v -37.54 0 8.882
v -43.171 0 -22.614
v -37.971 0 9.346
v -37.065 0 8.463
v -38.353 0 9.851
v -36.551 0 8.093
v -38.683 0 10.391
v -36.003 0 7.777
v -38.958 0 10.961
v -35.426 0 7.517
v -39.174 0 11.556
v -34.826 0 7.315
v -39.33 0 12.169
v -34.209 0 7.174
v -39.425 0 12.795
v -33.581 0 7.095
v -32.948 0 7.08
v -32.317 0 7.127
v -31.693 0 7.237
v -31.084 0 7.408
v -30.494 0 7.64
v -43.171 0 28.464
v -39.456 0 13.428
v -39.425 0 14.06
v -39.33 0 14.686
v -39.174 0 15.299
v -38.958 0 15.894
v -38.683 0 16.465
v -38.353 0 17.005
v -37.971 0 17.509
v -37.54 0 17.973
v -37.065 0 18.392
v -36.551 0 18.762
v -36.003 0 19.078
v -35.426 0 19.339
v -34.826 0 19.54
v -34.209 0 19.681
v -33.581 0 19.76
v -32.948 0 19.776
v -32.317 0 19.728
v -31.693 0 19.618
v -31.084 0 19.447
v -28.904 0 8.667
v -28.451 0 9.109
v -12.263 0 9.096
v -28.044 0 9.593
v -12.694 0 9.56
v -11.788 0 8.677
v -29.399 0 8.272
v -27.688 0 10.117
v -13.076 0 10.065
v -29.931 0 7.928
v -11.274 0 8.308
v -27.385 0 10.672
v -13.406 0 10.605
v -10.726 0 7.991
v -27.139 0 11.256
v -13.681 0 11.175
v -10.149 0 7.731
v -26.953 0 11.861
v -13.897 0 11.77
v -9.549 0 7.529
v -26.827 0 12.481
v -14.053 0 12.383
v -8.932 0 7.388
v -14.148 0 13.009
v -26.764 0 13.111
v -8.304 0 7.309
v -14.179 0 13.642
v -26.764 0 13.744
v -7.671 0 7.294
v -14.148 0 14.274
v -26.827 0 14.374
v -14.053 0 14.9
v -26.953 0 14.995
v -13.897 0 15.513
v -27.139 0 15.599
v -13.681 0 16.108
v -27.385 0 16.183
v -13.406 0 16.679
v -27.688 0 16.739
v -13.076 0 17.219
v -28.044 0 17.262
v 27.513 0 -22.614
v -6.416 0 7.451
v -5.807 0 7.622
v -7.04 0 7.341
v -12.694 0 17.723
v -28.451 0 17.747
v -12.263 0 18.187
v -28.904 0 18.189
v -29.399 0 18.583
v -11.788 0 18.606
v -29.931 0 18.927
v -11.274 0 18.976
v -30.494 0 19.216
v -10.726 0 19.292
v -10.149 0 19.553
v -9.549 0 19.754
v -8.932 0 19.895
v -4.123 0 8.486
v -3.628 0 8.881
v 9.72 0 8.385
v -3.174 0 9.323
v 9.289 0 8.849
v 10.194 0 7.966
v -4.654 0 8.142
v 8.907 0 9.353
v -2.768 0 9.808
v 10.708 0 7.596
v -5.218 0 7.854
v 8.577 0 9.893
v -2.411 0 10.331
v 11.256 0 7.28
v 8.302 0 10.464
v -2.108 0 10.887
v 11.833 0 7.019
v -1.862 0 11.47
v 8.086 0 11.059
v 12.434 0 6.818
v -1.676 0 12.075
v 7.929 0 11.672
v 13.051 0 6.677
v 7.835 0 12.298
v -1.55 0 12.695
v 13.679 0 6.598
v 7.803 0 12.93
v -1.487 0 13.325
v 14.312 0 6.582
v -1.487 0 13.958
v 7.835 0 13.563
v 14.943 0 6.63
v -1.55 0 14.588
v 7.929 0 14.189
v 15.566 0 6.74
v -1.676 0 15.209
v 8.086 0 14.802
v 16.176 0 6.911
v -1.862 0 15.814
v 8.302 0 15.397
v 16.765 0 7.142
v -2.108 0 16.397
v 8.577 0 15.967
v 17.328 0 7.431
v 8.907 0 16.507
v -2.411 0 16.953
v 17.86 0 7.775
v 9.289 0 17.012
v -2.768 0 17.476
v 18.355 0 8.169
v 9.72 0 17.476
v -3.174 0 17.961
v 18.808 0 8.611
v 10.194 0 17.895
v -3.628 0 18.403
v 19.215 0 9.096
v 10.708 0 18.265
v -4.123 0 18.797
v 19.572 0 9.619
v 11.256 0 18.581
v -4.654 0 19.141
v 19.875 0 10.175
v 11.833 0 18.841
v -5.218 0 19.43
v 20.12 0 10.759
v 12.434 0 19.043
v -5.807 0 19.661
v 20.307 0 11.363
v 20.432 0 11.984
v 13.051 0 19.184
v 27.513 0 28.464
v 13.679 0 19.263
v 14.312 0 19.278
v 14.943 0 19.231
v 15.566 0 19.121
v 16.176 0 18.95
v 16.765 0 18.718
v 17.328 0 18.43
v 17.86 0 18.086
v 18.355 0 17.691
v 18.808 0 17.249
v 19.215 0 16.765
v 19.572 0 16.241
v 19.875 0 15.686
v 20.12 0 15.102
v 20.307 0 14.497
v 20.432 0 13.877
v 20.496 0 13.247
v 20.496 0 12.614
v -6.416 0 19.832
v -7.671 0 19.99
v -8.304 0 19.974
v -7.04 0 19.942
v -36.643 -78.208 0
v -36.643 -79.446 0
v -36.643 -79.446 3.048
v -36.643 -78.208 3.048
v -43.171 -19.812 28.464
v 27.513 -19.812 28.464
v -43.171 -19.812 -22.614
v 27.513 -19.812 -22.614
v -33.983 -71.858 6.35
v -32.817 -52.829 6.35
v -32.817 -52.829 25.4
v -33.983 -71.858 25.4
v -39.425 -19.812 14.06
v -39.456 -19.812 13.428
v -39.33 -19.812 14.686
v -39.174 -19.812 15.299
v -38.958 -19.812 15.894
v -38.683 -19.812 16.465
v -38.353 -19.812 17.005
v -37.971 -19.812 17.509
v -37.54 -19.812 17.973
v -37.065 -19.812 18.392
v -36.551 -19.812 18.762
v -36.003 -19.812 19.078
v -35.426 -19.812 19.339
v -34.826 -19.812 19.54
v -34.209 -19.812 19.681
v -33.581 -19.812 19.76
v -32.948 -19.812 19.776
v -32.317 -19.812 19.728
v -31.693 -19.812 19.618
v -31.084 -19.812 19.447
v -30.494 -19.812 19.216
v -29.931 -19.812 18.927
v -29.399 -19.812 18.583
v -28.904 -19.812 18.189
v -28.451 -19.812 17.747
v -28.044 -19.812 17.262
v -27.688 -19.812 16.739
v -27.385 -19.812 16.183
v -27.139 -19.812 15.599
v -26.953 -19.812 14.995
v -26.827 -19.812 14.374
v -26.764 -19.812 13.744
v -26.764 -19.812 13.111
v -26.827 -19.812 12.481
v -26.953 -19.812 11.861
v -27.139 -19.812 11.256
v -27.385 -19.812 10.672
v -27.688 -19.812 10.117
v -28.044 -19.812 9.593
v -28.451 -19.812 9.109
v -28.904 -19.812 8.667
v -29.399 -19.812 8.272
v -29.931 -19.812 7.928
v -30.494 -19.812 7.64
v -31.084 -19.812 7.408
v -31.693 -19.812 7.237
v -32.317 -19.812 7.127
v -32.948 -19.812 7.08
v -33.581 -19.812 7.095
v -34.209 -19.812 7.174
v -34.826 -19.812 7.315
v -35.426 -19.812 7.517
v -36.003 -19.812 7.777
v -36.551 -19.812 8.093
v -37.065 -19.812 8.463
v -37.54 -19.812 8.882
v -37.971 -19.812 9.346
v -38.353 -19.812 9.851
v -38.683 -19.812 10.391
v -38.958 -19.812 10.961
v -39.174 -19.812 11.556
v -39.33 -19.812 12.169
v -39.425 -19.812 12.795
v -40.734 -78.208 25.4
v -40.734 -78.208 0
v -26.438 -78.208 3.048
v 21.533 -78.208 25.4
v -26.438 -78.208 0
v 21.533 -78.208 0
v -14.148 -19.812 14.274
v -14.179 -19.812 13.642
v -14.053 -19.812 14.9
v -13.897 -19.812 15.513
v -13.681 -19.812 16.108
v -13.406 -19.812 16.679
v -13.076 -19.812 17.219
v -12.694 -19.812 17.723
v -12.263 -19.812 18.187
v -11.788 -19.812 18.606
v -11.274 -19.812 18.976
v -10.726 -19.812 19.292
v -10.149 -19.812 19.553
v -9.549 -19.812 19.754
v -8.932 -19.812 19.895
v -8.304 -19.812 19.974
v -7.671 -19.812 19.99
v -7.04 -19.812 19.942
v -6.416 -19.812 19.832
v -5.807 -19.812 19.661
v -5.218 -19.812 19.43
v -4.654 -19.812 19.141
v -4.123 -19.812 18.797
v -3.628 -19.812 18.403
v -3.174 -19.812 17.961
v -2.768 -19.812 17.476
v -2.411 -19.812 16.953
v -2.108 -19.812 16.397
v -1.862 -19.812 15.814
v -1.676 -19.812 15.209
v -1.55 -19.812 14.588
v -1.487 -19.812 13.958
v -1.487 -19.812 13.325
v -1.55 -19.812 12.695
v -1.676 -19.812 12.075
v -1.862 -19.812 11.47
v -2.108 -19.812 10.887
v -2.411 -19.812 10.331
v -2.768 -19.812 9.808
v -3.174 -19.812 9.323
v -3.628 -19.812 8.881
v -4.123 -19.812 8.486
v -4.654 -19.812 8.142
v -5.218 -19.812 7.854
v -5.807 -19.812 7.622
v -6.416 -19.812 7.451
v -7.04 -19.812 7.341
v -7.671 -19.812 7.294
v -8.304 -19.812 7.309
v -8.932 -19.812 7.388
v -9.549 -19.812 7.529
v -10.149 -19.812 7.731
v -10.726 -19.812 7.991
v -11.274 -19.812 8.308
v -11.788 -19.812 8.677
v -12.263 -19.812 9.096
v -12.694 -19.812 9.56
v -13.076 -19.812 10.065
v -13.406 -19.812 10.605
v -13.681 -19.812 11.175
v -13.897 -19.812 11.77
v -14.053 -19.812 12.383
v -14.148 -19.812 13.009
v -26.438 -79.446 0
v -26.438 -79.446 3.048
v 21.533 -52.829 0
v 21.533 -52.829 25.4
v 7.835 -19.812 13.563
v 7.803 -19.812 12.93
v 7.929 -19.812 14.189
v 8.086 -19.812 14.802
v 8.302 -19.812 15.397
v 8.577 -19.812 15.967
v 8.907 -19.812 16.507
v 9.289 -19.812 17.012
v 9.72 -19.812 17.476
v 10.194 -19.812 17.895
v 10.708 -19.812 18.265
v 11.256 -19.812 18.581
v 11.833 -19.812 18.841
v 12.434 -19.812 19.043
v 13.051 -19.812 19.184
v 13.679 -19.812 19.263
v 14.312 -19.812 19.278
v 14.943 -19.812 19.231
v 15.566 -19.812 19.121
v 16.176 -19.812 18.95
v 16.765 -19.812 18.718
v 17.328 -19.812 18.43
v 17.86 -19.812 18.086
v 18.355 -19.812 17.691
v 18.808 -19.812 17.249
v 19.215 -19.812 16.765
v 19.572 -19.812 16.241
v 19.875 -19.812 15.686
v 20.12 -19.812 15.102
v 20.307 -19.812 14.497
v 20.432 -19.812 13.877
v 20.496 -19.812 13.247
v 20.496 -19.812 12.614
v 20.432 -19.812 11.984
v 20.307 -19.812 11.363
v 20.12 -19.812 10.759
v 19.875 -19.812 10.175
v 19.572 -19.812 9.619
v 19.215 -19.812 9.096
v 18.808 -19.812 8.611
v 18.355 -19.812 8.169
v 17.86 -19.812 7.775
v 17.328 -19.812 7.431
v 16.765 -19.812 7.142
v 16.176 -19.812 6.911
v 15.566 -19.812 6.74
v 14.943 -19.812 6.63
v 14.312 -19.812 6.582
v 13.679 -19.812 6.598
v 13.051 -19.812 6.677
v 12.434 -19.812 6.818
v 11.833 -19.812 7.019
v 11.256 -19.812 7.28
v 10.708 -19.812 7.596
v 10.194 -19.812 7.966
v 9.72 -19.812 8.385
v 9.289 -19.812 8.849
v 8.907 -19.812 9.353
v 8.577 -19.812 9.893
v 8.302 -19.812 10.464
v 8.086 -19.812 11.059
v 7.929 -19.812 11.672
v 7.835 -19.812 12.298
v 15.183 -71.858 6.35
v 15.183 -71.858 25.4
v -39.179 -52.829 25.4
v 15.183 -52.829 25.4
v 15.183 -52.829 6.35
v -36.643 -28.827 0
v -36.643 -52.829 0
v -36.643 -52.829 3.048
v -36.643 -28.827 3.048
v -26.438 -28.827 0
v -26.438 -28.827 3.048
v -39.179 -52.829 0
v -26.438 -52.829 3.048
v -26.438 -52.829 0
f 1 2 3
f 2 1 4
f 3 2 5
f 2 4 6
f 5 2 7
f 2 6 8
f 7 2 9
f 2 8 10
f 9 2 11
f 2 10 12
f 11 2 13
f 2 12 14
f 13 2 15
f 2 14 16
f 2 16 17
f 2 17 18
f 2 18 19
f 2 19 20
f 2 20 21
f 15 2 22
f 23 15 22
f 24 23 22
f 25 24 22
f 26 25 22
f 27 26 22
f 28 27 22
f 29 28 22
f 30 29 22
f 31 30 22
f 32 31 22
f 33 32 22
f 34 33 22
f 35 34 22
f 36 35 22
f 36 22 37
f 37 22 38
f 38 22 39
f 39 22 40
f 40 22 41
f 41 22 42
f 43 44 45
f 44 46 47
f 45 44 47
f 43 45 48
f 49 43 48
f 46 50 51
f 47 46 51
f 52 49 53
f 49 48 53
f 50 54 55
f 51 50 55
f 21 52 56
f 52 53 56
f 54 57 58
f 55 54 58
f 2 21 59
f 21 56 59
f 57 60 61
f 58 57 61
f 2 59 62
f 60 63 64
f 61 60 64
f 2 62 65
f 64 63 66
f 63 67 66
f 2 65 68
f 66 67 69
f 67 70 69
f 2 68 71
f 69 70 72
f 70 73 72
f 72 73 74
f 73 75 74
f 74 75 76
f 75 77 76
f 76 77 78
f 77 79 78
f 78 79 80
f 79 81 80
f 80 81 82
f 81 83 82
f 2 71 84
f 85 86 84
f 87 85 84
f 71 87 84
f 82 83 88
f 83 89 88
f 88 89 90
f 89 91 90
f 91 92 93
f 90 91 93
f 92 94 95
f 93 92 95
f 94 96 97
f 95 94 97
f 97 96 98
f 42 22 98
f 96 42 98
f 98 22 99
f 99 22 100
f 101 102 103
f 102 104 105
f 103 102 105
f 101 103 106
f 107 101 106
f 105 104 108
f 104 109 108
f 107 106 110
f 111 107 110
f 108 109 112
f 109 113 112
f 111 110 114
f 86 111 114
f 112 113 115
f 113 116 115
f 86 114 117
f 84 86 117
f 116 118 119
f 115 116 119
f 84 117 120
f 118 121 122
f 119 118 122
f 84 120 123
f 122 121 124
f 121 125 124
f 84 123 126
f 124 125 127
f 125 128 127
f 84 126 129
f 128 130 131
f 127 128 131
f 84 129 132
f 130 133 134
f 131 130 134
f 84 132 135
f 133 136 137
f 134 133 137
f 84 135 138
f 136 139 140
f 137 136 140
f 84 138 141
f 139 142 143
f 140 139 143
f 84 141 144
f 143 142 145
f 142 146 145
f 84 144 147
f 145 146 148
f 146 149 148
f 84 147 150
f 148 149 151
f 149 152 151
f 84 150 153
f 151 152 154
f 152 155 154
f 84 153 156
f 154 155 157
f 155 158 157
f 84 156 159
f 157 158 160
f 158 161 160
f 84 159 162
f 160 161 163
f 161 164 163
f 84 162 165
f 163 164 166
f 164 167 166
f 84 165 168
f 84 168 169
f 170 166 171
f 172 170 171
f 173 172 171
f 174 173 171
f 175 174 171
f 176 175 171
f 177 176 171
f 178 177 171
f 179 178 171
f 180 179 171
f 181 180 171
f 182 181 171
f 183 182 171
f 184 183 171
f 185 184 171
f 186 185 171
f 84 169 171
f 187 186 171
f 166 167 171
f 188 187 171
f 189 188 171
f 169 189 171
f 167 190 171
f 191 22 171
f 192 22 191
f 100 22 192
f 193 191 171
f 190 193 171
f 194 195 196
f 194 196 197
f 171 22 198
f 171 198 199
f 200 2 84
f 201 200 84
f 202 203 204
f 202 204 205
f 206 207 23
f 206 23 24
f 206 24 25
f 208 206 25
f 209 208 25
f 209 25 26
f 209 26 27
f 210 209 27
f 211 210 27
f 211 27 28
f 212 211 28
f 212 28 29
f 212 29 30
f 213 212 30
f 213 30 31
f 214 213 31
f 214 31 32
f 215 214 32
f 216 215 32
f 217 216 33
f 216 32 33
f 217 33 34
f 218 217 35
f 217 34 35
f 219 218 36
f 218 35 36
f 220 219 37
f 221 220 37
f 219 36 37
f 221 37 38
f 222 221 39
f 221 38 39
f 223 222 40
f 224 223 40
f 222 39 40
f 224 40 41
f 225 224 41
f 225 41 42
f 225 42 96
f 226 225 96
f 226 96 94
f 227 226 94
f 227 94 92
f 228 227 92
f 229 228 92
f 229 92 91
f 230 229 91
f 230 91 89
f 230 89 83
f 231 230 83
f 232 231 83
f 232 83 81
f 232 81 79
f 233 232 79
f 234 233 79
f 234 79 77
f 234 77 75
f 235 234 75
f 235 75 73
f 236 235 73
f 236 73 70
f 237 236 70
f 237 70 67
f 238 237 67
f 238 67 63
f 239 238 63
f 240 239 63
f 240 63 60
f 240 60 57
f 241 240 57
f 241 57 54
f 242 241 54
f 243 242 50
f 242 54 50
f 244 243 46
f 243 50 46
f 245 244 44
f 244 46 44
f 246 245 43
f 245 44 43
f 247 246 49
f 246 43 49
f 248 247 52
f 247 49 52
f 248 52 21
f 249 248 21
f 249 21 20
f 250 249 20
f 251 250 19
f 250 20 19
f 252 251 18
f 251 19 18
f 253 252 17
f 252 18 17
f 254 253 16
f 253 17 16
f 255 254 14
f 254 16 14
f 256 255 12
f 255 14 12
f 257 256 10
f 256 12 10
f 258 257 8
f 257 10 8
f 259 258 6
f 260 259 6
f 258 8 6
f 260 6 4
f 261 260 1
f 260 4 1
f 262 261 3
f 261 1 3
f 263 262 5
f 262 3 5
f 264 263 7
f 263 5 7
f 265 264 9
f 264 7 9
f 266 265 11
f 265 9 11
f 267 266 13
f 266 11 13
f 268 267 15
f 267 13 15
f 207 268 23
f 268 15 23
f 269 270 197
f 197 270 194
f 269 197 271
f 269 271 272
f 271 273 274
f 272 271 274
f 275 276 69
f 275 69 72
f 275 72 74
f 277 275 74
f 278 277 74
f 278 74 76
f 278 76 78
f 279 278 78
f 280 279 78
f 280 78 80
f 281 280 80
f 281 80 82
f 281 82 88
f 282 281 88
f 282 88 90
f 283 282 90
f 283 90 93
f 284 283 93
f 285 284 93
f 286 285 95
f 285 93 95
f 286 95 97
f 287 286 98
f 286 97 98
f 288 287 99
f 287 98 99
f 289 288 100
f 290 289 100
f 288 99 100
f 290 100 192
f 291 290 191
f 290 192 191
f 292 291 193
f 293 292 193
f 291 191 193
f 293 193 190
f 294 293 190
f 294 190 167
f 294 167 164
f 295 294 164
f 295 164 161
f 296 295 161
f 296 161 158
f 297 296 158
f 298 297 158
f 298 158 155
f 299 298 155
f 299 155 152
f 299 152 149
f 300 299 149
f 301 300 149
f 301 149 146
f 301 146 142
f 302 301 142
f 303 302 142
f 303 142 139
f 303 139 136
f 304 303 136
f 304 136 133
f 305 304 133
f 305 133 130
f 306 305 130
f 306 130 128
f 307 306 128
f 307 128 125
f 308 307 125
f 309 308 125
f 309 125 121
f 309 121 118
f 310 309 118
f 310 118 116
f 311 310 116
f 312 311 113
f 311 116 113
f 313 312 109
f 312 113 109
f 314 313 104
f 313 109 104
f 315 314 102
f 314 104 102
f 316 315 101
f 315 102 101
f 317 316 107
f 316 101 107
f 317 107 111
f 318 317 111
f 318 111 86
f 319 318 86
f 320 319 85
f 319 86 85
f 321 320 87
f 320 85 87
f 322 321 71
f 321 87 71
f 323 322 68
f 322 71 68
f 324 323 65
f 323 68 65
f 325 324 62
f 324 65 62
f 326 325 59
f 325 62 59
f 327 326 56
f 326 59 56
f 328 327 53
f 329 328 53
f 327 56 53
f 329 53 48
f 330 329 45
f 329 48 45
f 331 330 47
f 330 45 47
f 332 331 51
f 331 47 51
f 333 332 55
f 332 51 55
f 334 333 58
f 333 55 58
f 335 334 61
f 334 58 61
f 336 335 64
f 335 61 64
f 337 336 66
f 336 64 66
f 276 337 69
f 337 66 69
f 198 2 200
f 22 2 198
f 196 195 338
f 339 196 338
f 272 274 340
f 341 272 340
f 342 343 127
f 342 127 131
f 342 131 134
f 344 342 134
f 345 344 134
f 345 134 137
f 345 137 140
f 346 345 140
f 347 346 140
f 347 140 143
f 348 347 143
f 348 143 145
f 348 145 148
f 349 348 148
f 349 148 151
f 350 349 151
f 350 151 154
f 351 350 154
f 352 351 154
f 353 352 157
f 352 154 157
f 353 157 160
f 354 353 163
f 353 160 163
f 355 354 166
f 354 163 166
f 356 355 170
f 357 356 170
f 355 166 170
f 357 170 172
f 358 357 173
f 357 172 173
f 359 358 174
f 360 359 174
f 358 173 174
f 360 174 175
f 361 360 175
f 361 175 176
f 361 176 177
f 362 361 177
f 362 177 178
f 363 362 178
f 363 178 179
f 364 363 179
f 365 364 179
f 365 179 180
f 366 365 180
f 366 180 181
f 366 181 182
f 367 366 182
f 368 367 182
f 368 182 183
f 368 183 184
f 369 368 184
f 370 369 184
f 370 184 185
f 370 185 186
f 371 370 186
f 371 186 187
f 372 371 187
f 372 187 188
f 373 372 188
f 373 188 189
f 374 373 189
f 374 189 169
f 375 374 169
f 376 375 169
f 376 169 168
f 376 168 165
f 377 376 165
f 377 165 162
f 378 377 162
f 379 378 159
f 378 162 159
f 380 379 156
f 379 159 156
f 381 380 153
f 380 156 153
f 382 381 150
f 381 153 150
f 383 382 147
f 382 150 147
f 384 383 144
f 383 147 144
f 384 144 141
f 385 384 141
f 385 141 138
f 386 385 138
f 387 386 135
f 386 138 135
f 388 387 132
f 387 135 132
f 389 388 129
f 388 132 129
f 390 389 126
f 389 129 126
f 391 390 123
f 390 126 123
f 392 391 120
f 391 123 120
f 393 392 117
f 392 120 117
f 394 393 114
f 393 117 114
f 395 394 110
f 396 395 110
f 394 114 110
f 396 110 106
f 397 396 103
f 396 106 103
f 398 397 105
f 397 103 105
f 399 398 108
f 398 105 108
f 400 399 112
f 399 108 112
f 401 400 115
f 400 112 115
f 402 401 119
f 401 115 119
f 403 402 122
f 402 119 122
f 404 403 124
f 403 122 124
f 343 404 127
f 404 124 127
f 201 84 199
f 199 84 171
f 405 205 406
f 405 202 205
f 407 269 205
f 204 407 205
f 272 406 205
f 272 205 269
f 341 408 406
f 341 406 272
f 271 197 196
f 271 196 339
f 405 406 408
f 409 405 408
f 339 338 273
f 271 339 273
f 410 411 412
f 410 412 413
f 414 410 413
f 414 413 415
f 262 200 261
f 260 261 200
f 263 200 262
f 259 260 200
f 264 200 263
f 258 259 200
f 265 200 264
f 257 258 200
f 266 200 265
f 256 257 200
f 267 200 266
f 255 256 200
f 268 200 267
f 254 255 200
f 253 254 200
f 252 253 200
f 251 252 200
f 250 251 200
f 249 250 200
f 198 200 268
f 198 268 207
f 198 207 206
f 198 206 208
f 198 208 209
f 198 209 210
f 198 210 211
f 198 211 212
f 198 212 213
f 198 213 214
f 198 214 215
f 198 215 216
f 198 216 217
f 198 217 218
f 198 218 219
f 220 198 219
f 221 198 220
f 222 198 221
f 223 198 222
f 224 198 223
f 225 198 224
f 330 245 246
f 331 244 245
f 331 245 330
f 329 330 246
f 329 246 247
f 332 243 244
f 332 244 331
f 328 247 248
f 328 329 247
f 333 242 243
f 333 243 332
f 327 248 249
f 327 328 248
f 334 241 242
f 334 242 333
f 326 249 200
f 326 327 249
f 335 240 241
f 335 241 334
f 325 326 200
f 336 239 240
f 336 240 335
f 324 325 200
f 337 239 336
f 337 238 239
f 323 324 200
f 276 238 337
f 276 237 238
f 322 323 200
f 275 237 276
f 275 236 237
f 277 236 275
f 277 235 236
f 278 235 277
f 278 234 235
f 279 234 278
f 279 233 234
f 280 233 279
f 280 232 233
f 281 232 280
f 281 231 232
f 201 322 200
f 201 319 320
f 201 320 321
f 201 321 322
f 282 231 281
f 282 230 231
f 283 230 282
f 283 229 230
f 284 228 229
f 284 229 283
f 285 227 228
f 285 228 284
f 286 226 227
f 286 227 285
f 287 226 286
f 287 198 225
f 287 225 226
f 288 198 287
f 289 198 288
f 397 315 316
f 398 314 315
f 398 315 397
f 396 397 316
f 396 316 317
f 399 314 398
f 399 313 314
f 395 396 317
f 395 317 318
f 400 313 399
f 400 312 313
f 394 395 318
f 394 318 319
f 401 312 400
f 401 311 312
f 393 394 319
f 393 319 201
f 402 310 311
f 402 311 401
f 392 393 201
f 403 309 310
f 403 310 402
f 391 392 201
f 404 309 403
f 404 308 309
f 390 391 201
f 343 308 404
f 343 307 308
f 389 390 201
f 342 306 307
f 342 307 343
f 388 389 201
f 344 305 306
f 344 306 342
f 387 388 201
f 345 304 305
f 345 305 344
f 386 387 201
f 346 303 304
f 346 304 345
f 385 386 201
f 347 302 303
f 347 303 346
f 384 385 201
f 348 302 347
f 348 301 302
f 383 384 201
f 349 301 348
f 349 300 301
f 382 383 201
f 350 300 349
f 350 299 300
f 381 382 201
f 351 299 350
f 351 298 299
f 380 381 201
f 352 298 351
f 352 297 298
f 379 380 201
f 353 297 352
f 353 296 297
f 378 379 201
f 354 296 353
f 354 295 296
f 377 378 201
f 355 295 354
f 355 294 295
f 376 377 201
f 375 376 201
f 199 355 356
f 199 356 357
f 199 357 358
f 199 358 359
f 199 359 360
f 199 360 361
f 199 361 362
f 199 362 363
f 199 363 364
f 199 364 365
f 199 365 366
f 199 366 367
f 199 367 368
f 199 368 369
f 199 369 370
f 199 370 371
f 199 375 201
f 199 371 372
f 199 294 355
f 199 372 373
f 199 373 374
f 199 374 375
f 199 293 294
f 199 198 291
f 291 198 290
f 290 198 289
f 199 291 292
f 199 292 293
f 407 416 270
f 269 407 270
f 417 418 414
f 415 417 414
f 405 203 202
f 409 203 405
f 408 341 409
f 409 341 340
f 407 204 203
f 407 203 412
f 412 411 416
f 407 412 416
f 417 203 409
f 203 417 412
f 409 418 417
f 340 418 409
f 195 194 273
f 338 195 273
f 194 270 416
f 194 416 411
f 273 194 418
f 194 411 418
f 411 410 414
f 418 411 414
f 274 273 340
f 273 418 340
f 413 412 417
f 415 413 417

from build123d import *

# Parameters (mm, degrees)
F0_W      = 70.683616
F0_H      = 51.078157
F1_DEPTH  = 19.812
F3_D      = 12.7
F5_D      = 12.7
F7_D      = 12.7
F9_DEPTH  = 25.4
F10_T     = -6.35
F11_W     = 10.204611
F11_H     = 50.619624
F12_DEPTH = 3.048


with BuildPart() as f1:
    # F0 (on Front) → F1 (new body)
    with BuildSketch(Plane.XZ):
        with Locations((-7.8293, 2.925079)):
            Rectangle(F0_W, F0_H)
    extrude(amount=F1_DEPTH)

    # F3 (through all)
    with Locations(Plane.XZ.offset(19.812)):
        with Locations((-33.106167, 13.427656)):
            Hole(F3_D / 2)

    # F5 (through all)
    with Locations(Plane.XZ.offset(19.812)):
        with Locations((14.153406, 12.930374)):
            Hole(F5_D / 2)

    # F7 (through all)
    with Locations(Plane.XZ.offset(19.812)):
        with Locations((-7.8293, 13.641678)):
            Hole(F7_D / 2)


with BuildPart() as f9:
    # F8 (on Top) → F9 (new body)
    with BuildSketch(Plane.XY):
        Polygon((-39.179049, -52.82893), (-40.73438, -78.207716), (21.53318, -78.207716), (21.53318, -52.82893), align=None)
    extrude(amount=F9_DEPTH)

    # F10
    f10_openings = [f9.faces().sort_by_distance(p)[0] for p in [
        (-8.822935, -52.82893, 12.7),
        (-9.213407, -65.571818, 25.4),
    ]]
    offset(amount=F10_T, openings=f10_openings)

    # F11 (on Top) → F12 (join)
    with BuildSketch(Plane.XY):
        with Locations((-31.540723, -54.136563)):
            Rectangle(F11_W, F11_H)
    extrude(amount=F12_DEPTH)


solid = Compound([f1.part, f9.part])
